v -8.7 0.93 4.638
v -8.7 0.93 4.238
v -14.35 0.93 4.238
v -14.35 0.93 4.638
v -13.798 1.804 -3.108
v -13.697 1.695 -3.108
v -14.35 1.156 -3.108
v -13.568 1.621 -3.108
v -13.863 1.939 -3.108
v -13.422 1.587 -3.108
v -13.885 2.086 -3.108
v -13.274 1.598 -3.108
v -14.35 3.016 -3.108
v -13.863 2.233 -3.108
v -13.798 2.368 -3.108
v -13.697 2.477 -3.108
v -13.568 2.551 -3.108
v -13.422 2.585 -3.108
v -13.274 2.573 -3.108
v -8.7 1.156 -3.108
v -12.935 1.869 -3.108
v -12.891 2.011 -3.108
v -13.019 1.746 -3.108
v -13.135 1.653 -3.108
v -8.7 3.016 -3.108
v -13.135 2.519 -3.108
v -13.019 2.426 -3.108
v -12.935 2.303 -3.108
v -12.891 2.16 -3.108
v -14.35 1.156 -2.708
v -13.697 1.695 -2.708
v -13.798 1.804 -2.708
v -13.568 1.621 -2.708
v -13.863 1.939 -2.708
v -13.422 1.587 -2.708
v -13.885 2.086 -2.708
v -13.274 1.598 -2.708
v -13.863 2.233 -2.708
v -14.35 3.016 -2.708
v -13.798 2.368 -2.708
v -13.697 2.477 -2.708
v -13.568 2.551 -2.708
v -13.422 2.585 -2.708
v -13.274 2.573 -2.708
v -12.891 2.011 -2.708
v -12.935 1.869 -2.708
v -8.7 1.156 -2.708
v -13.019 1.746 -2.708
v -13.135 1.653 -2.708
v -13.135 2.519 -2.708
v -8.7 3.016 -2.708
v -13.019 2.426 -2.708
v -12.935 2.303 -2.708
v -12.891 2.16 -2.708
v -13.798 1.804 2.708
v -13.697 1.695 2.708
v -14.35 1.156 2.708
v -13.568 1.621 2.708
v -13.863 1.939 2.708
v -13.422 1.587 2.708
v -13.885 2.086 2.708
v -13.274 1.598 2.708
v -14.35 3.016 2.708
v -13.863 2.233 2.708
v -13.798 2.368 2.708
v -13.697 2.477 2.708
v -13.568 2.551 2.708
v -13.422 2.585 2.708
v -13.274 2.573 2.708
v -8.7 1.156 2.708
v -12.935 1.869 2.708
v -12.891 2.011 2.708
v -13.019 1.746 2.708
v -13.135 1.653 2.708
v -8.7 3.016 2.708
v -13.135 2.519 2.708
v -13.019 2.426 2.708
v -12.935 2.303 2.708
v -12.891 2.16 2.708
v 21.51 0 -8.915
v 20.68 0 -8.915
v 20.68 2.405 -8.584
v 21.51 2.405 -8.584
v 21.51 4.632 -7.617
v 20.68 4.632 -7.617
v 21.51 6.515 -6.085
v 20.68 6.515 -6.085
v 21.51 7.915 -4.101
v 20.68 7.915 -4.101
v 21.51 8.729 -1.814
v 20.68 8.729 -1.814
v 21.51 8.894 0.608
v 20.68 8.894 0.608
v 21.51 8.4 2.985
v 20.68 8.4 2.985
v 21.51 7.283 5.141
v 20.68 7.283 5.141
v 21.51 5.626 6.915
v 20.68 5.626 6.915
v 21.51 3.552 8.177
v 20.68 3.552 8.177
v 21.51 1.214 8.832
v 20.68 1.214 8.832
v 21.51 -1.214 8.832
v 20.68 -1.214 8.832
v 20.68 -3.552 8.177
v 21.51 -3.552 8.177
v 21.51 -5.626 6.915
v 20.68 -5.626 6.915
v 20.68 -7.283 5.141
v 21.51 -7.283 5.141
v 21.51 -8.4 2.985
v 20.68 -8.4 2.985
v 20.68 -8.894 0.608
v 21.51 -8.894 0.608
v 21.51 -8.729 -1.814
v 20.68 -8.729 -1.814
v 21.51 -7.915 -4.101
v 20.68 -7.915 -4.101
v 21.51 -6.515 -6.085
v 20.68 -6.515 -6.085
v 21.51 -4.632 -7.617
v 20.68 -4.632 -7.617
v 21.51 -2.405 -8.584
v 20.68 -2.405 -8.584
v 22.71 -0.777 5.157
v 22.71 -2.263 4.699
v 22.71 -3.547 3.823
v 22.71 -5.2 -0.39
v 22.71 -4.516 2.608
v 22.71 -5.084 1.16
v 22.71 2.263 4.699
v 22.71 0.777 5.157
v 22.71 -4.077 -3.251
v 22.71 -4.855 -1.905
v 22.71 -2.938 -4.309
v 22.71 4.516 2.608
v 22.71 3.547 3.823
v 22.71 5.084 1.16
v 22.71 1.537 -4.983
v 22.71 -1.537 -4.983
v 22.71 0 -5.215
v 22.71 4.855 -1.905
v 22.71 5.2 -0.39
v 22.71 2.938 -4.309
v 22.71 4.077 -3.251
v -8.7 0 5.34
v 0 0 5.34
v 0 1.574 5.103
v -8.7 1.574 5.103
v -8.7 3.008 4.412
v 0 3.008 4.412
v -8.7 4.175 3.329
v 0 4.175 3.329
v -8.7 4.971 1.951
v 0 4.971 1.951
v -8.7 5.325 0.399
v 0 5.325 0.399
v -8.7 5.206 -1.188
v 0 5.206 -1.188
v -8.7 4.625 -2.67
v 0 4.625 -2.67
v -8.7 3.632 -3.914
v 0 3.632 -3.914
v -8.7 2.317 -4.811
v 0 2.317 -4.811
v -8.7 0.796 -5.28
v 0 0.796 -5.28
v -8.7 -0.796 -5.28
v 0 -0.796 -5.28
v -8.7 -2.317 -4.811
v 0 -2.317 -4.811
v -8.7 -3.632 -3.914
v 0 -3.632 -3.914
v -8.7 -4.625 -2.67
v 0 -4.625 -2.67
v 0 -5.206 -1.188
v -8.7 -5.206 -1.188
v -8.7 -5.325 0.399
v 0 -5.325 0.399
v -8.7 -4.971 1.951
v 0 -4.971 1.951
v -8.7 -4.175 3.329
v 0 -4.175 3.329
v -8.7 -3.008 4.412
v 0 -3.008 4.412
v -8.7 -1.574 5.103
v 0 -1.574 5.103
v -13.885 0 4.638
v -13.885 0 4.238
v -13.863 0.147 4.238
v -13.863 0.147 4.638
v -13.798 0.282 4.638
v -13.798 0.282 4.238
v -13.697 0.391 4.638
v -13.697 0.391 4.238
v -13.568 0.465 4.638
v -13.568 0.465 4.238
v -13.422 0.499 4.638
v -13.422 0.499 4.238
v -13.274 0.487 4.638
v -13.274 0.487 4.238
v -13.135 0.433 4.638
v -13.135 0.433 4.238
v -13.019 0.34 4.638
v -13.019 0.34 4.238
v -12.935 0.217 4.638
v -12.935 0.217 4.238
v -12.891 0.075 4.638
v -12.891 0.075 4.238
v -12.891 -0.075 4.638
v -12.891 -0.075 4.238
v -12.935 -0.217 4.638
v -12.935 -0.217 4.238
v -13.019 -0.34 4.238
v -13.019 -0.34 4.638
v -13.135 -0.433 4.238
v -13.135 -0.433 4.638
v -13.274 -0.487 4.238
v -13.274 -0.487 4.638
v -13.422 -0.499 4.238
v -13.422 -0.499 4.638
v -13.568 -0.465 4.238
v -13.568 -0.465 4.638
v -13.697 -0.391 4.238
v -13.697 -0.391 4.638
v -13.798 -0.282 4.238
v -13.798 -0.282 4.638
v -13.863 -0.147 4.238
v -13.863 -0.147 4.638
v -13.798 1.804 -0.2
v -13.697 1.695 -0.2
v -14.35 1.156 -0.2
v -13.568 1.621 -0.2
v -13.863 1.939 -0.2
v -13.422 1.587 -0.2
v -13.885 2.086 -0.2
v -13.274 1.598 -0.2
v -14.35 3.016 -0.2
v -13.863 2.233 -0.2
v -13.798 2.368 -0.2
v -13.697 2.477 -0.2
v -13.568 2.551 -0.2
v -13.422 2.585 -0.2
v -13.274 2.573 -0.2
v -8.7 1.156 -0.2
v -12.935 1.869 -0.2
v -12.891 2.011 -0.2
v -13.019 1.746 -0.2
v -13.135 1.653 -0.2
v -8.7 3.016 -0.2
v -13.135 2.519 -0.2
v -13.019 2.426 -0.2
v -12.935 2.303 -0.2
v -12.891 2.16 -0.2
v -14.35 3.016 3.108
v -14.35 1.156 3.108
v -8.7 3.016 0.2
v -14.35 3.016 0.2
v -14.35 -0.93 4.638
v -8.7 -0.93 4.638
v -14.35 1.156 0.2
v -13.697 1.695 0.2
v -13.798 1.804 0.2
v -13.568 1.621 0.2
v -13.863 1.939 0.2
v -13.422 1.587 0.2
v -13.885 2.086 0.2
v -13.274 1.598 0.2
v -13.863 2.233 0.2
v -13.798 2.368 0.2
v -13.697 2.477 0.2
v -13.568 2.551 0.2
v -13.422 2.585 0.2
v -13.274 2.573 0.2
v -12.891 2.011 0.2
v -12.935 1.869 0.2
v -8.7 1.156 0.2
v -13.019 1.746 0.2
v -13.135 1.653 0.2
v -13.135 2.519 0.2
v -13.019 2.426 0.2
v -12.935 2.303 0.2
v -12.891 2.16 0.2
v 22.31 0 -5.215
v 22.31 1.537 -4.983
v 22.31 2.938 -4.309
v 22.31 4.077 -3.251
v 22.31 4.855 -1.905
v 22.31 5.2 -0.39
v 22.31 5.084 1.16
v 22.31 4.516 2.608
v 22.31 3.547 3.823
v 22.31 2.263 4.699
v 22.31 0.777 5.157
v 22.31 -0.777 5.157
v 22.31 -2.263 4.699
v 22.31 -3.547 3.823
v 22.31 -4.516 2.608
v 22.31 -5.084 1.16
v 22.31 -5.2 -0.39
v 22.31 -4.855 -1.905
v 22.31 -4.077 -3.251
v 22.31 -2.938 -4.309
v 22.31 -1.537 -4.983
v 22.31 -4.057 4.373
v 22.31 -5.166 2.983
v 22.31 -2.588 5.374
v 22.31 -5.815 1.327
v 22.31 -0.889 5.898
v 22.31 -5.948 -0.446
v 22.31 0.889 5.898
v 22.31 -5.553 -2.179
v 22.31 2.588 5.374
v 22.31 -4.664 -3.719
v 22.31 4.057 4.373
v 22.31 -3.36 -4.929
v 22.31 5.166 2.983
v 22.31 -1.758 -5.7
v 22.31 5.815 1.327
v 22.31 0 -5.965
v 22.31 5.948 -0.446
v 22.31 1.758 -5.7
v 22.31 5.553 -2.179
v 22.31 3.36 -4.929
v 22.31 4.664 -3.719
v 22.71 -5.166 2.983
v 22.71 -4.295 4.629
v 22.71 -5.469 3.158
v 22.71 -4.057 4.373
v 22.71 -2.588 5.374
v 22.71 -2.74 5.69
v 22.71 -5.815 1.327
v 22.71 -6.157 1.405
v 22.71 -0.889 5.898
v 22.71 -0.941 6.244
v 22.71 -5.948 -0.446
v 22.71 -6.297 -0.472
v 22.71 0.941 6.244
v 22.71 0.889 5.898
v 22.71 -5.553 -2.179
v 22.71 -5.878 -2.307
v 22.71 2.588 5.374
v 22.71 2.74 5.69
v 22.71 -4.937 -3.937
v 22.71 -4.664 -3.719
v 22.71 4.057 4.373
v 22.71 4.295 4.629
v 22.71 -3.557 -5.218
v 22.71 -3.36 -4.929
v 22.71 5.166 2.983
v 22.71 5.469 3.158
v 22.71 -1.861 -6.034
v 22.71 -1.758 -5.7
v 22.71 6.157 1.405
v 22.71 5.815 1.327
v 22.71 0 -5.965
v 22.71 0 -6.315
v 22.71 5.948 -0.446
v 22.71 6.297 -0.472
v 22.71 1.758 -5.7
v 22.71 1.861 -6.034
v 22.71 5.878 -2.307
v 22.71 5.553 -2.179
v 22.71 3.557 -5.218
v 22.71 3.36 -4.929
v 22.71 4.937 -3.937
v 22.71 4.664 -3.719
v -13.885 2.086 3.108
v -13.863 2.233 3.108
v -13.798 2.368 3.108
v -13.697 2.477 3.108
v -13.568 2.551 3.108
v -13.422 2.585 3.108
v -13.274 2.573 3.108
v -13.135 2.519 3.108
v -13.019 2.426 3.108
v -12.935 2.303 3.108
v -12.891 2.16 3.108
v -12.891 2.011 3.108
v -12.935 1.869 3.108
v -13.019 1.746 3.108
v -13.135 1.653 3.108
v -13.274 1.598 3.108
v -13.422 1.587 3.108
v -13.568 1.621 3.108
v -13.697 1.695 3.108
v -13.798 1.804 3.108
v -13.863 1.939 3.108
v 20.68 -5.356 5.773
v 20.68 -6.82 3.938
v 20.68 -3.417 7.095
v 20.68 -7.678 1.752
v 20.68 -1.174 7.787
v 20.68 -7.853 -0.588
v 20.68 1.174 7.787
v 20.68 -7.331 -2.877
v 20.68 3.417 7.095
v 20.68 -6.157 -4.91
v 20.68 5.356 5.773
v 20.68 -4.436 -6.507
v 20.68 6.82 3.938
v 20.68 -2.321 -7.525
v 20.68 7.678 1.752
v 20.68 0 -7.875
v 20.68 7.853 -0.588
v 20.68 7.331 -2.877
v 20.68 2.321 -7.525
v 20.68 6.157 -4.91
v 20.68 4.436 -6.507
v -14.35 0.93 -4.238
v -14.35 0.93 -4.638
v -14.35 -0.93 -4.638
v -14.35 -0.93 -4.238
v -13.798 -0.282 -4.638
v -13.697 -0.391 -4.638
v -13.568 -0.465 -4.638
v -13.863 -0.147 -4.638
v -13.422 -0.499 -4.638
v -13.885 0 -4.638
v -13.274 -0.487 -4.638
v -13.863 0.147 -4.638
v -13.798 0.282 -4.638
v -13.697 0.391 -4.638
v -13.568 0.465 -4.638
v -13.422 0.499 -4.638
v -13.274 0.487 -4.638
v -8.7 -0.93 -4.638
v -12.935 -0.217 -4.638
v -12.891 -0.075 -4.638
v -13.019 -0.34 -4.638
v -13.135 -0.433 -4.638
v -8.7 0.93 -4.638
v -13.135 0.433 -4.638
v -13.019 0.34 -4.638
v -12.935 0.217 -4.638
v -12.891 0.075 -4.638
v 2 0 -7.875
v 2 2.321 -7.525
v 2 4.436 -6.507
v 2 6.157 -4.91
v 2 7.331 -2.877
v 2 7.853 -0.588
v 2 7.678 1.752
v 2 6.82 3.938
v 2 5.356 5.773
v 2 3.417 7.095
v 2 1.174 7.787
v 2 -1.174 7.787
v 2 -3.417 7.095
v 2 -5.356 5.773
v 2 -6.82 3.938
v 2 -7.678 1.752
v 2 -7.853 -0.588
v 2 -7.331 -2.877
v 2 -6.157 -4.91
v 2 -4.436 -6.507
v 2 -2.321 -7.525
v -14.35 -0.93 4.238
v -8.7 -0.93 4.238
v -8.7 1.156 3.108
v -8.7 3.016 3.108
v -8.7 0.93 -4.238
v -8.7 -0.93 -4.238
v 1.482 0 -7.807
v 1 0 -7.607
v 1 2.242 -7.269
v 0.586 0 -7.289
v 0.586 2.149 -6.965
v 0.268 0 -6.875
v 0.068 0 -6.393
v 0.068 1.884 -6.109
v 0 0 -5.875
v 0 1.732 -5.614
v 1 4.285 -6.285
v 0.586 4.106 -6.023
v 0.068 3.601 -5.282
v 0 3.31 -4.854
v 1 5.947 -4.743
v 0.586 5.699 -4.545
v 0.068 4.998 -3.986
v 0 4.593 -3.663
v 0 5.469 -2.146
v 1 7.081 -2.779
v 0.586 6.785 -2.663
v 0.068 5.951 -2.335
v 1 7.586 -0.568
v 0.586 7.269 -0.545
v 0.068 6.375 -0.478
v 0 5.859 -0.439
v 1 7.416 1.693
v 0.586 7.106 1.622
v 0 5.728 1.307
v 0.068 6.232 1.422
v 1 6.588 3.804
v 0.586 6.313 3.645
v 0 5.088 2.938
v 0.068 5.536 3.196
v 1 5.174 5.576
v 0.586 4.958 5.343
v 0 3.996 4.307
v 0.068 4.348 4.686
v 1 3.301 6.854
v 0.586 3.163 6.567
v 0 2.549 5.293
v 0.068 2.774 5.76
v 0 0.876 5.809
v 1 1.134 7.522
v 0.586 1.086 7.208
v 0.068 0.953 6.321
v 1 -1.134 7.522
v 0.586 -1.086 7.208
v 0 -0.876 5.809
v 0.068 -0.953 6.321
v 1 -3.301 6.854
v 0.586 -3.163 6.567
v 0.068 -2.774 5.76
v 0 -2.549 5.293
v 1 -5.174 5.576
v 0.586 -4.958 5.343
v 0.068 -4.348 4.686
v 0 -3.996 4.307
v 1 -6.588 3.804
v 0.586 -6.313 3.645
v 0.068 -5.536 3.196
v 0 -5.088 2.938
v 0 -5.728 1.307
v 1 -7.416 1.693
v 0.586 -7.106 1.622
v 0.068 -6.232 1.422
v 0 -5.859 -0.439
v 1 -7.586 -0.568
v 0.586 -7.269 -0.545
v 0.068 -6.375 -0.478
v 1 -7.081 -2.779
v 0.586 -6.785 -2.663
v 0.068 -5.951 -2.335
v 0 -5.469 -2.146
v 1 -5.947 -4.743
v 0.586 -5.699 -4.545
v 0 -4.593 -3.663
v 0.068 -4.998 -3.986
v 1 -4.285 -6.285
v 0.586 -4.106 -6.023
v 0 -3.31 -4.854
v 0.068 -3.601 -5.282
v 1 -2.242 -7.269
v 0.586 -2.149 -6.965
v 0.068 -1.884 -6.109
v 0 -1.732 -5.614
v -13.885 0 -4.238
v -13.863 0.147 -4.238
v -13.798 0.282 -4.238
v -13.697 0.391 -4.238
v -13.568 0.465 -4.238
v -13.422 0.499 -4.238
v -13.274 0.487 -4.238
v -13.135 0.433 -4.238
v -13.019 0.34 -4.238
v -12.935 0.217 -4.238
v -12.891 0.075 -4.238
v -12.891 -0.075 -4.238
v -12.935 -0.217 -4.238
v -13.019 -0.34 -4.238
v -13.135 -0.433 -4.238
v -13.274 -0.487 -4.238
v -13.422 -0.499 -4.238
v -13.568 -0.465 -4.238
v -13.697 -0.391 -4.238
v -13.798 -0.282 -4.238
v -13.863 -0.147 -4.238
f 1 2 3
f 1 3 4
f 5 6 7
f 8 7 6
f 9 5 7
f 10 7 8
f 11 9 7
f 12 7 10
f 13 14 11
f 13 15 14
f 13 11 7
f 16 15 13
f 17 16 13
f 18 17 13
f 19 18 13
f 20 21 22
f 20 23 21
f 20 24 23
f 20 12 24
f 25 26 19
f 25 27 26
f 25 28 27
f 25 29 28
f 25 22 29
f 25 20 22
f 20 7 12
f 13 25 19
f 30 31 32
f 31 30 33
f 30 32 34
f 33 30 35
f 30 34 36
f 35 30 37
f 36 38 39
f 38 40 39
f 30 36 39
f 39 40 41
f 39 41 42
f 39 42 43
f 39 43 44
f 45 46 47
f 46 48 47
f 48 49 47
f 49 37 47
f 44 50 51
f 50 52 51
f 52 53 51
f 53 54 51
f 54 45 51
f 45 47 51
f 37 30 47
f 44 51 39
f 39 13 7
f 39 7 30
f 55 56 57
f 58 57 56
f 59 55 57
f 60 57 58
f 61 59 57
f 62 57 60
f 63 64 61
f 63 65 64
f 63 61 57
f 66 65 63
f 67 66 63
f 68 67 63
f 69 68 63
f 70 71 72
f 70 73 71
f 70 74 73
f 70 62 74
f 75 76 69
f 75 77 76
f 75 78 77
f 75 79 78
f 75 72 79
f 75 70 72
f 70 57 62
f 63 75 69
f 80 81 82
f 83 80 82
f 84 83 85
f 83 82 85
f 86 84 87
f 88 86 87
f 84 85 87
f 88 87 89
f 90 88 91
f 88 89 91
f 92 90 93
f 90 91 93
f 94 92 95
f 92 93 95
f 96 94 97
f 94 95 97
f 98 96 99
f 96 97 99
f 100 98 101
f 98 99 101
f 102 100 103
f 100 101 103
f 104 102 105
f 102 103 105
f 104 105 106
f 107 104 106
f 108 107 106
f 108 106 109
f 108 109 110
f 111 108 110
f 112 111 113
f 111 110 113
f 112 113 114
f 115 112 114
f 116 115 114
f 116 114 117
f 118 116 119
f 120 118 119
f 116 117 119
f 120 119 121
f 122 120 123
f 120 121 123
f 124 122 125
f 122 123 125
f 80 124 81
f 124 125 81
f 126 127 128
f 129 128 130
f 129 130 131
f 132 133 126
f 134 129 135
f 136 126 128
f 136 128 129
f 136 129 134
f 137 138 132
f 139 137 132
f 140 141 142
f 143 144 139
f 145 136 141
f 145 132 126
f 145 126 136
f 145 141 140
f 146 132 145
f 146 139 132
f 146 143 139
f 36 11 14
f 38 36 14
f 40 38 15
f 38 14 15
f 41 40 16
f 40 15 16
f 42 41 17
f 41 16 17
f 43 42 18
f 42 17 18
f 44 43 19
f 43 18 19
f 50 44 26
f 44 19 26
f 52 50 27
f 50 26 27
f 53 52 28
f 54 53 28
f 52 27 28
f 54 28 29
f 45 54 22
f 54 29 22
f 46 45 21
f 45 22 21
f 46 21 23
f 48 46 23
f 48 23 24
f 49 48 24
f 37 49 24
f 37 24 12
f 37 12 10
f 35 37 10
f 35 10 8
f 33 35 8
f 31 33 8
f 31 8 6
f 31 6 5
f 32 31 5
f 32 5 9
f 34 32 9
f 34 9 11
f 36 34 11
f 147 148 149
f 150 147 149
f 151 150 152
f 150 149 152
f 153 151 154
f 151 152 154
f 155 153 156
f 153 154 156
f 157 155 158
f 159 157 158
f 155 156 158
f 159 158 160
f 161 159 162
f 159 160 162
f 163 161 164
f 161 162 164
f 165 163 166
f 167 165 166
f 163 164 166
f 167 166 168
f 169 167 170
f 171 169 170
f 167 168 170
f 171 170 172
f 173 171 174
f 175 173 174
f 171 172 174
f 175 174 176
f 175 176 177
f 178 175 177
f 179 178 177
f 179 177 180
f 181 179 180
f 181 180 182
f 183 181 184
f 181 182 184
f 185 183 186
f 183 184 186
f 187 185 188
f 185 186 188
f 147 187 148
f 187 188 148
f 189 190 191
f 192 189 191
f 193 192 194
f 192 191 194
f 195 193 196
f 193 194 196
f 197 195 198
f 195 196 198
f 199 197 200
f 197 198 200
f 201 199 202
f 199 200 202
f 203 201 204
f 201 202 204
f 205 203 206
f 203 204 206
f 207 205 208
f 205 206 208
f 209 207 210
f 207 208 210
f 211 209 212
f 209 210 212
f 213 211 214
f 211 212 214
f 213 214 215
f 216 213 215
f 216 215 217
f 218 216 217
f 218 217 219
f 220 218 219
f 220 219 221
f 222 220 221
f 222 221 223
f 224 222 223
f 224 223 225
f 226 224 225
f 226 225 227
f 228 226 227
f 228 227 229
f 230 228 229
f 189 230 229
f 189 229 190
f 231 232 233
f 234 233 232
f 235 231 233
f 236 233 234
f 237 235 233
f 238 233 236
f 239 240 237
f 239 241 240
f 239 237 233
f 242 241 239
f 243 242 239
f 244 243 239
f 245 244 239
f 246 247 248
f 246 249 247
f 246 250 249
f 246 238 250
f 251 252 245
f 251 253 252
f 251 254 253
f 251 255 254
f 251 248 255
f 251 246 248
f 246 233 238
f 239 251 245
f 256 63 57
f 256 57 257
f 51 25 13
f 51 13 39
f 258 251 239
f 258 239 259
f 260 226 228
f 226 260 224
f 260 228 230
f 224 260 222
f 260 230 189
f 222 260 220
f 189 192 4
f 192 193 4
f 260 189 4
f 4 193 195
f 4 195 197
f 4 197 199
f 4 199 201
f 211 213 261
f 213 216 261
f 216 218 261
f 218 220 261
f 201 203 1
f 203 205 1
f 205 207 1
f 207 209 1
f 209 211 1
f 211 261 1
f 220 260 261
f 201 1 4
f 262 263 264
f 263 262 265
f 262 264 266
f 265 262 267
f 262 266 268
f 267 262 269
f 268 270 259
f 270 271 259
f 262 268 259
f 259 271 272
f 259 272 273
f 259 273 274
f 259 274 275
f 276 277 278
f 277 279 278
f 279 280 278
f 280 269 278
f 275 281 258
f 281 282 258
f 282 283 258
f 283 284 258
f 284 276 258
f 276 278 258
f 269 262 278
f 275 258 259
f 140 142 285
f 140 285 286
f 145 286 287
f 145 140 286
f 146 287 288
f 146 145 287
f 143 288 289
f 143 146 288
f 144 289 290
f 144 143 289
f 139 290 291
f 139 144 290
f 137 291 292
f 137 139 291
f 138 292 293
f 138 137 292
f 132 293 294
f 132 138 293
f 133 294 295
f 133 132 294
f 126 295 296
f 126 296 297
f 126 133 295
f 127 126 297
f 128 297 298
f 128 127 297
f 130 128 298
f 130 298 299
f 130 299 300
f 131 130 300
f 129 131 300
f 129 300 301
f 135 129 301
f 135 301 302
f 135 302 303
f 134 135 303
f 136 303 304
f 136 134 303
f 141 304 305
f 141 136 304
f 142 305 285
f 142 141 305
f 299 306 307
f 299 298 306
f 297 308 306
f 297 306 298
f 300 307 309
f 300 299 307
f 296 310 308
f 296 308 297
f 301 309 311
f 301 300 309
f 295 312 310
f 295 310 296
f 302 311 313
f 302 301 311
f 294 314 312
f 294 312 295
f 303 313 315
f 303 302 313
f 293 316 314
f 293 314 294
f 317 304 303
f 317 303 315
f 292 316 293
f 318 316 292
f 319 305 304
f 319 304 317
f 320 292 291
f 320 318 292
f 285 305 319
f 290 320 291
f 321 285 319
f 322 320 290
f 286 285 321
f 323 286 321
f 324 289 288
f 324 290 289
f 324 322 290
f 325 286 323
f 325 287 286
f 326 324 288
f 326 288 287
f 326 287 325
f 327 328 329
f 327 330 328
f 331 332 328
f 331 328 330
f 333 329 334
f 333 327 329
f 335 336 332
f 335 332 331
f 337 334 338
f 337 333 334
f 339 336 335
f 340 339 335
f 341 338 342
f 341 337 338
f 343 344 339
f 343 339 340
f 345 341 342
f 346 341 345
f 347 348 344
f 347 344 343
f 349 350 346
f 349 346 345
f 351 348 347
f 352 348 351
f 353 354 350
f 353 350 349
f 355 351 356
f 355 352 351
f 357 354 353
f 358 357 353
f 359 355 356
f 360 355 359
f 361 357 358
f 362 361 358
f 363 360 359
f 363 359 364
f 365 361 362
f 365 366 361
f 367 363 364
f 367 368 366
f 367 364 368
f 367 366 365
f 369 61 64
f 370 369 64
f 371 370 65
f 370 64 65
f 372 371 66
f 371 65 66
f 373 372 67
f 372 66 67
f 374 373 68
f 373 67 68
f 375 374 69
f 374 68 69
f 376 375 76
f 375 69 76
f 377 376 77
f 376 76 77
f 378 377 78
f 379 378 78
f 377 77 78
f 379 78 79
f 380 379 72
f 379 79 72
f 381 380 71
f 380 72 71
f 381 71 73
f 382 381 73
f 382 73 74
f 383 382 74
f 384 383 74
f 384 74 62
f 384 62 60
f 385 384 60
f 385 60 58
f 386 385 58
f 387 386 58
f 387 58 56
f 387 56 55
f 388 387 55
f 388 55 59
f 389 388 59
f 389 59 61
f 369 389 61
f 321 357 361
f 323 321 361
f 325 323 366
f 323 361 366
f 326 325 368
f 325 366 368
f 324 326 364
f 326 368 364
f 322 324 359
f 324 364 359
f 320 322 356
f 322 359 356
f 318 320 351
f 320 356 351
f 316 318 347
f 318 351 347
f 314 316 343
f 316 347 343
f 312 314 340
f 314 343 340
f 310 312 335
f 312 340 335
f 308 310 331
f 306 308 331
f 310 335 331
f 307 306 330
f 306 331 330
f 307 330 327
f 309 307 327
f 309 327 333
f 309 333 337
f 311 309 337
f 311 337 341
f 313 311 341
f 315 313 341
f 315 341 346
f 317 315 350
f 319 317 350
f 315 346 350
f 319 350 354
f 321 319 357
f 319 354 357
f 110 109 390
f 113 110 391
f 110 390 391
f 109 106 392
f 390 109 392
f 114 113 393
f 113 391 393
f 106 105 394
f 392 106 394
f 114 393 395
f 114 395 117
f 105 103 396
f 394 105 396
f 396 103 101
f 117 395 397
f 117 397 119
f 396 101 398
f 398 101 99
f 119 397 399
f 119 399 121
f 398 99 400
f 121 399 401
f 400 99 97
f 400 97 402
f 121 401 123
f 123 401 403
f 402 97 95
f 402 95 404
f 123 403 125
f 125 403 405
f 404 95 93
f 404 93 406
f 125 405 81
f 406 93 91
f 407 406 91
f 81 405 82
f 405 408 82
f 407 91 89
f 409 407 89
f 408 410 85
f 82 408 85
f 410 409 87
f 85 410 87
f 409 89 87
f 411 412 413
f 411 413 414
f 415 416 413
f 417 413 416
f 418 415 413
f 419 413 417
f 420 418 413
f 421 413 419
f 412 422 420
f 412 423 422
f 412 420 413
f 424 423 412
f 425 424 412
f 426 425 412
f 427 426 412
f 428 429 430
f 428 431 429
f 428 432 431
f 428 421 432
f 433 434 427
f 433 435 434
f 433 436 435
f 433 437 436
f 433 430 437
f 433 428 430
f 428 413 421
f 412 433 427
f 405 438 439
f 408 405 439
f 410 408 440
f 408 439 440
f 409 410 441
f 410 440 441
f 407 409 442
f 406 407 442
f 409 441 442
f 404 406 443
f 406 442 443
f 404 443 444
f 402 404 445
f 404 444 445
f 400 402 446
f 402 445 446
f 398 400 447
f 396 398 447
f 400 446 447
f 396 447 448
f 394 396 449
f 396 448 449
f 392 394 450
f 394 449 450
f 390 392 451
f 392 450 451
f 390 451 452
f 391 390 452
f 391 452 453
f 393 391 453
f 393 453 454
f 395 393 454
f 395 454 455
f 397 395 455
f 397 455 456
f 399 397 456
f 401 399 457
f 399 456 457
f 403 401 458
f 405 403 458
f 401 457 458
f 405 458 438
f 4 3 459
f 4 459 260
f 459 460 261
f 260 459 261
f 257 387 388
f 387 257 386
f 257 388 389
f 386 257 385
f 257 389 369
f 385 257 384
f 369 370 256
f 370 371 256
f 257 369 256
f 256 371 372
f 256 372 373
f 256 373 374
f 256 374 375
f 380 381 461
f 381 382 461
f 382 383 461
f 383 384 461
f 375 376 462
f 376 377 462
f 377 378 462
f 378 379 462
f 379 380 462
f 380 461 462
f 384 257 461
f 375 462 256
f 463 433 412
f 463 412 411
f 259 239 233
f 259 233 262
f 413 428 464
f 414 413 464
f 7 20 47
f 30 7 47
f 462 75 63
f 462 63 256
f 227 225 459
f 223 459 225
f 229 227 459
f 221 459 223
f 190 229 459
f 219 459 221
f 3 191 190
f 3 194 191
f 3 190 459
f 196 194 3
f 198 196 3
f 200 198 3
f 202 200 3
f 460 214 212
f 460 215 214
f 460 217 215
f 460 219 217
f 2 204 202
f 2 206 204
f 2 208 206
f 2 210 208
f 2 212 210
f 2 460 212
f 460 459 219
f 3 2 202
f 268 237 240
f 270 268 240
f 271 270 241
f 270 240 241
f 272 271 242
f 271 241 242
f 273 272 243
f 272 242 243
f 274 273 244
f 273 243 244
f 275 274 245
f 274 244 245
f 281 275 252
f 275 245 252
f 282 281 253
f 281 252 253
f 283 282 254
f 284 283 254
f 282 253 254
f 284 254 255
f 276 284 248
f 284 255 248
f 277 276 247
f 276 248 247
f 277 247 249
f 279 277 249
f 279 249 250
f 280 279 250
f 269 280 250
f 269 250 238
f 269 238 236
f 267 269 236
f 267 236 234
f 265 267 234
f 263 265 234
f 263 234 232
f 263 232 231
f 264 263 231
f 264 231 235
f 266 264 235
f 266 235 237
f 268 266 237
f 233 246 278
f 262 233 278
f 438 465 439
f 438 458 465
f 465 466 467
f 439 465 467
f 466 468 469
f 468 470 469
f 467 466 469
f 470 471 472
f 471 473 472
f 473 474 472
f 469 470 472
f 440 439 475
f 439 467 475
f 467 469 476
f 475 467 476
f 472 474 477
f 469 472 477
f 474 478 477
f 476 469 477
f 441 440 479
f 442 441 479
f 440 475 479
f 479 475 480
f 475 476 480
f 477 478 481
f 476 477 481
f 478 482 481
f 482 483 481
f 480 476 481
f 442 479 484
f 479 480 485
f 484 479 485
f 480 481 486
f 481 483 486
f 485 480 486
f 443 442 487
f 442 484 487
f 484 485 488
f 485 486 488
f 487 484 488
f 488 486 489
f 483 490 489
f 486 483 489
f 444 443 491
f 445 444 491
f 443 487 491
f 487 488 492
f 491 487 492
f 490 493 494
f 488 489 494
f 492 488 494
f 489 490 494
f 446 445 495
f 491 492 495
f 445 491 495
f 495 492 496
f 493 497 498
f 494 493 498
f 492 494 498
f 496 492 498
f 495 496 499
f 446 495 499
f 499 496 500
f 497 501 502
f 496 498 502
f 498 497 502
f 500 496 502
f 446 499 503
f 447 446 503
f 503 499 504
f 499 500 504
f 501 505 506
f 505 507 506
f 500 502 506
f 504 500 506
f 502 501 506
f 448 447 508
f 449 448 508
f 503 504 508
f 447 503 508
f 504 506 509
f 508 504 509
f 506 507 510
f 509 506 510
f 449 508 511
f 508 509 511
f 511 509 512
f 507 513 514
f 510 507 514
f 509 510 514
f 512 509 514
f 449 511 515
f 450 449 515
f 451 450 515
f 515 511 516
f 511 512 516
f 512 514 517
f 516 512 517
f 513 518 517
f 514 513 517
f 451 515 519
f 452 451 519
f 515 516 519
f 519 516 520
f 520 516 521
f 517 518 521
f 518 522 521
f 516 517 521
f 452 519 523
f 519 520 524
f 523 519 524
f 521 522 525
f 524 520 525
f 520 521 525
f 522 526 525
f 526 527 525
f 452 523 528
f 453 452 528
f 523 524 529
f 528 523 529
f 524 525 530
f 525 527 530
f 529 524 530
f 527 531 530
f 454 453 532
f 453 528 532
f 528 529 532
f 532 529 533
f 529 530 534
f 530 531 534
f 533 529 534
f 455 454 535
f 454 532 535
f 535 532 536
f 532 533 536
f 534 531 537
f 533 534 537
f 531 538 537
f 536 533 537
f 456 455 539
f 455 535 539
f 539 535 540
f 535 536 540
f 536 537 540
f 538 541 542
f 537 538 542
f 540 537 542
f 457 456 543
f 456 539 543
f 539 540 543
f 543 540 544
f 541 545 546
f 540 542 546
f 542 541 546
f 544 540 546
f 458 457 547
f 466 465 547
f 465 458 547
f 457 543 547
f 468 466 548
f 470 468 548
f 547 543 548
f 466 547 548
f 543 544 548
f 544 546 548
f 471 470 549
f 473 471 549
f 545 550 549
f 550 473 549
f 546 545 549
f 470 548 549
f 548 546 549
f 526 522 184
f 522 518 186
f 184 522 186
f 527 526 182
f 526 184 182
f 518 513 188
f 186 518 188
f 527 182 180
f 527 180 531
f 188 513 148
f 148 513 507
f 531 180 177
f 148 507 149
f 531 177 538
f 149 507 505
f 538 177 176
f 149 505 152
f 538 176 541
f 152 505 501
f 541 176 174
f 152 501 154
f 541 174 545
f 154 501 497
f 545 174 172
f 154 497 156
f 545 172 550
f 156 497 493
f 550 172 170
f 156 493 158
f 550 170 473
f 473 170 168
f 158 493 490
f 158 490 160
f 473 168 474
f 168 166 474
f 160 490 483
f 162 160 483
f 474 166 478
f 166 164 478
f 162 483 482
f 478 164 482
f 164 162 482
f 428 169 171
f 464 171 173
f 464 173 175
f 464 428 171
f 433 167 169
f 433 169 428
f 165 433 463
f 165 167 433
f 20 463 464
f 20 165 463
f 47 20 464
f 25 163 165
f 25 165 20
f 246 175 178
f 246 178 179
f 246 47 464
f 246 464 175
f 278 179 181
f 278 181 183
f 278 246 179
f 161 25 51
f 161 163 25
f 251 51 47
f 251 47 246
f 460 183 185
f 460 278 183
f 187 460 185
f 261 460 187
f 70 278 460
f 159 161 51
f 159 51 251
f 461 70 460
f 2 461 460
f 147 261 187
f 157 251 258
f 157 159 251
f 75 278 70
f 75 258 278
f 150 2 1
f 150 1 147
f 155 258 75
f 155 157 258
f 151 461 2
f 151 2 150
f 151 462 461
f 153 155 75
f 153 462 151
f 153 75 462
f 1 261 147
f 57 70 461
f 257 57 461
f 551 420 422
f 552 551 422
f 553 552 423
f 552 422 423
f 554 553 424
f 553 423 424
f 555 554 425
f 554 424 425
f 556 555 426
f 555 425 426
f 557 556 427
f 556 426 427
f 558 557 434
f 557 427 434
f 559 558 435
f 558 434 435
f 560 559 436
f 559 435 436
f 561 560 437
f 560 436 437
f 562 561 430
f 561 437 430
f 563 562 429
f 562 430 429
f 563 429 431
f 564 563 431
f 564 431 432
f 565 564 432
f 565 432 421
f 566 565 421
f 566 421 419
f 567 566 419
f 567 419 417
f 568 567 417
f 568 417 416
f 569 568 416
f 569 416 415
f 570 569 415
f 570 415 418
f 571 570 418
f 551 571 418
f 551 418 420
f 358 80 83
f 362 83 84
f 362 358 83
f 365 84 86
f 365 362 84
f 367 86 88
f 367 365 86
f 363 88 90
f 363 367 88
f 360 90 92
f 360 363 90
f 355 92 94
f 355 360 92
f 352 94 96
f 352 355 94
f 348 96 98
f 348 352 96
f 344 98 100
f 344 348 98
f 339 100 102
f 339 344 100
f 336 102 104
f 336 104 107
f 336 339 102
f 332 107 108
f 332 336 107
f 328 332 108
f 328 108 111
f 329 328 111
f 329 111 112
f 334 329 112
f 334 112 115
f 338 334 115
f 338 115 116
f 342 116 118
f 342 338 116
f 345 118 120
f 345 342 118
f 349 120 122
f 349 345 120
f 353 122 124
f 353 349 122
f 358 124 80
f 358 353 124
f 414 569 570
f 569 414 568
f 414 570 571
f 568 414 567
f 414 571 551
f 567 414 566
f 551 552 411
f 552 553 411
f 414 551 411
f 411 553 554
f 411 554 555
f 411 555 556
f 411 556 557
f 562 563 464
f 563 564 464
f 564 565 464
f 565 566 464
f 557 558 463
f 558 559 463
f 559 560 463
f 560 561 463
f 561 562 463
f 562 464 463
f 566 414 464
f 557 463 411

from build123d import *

# Parameters (mm, degrees)
SKETCH1_R           = 7.875
BOSS_EXTRUDE1_DEPTH = 20.68
SKETCH2_R           = 8.915
BOSS_EXTRUDE2_DEPTH = 2.03
SKETCH3_R           = 5.965
SKETCH3_R_2         = 5.215
CUT_EXTRUDE1_DEPTH  = 0.4
CHAMFER1_SIZE       = 1.2
CHAMFER1_SIZE2      = 2.6
SKETCH4_R           = 5.34
BOSS_EXTRUDE3_DEPTH = 8.7
SKETCH5_W           = 0.4
SKETCH5_H           = 1.86
BOSS_EXTRUDE4_DEPTH = 5.65
SKETCH6_R           = 0.5
CUT_EXTRUDE2_DEPTH  = 14.552865697
FILLET1_R           = 2


with BuildPart() as part:
    # Sketch1 → Boss-Extrude1 (new body)
    with BuildSketch(Plane(origin=(0, 0, 0), x_dir=(0, 0, -1), z_dir=(1, 0, 0))):
        Circle(SKETCH1_R)
    extrude(amount=BOSS_EXTRUDE1_DEPTH)

    # Sketch2 → Boss-Extrude2 (add)
    with BuildSketch(Plane(origin=(20.68, 0, 0), x_dir=(0, 0, -1), z_dir=(1, 0, 0))):
        Circle(SKETCH2_R)
    extrude(amount=BOSS_EXTRUDE2_DEPTH)

    # Sketch3 → Cut-Extrude1 (cut)
    with BuildSketch(Plane(origin=(22.71, 0, 0), x_dir=(0, 0, -1), z_dir=(1, 0, 0))):
        Circle(SKETCH3_R)
        Circle(SKETCH3_R_2, mode=Mode.SUBTRACT)
    extrude(amount=-CUT_EXTRUDE1_DEPTH, mode=Mode.SUBTRACT)

    # Chamfer1
    chamfer1_edges = [part.edges().sort_by_distance(p)[0] for p in [
        (22.71, 0, 8.915),
    ]]
    chamfer1_side = [part.faces().sort_by_distance(p)[0] for p in [
        (21.695, 0, 8.915),
    ]]
    chamfer(chamfer1_edges, length=CHAMFER1_SIZE, length2=CHAMFER1_SIZE2, reference=chamfer1_side[0])

    # Sketch4 → Boss-Extrude3 (add)
    with BuildSketch(Plane.ZY):
        Circle(SKETCH4_R)
    extrude(amount=BOSS_EXTRUDE3_DEPTH)

    # Sketch5 → Boss-Extrude4 (add)
    with BuildSketch(Plane.ZY.offset(8.7)):
        with Locations((-2.90816811, 2.08596309)):
            Rectangle(SKETCH5_W, SKETCH5_H)
        with Locations((0, 2.08596309)):
            Rectangle(SKETCH5_W, SKETCH5_H)
        with Locations((2.90816811, 2.08596309)):
            Rectangle(SKETCH5_W, SKETCH5_H)
        with Locations((4.437865697, 0)):
            Rectangle(SKETCH5_W, SKETCH5_H)
        with Locations((-4.437865697, 0)):
            Rectangle(SKETCH5_W, SKETCH5_H)
    extrude(amount=BOSS_EXTRUDE4_DEPTH)

    # Sketch6 → Cut-Extrude2 (cut, through all)
    with BuildSketch(Plane(origin=(0, 0, -4.637865697), x_dir=(-1, 0, 0), z_dir=(0, 0, -1))):
        with Locations((13.385032673, 0)):
            Circle(SKETCH6_R)
        with Locations((13.385032673, 2.08596309)):
            Circle(SKETCH6_R)
    extrude(amount=-CUT_EXTRUDE2_DEPTH, mode=Mode.SUBTRACT)

    # Fillet1
    fillet1_edges = [part.edges().sort_by_distance(p)[0] for p in [
        (0, 0, 7.875),
    ]]
    fillet(fillet1_edges, radius=FILLET1_R)


solid = part.part
